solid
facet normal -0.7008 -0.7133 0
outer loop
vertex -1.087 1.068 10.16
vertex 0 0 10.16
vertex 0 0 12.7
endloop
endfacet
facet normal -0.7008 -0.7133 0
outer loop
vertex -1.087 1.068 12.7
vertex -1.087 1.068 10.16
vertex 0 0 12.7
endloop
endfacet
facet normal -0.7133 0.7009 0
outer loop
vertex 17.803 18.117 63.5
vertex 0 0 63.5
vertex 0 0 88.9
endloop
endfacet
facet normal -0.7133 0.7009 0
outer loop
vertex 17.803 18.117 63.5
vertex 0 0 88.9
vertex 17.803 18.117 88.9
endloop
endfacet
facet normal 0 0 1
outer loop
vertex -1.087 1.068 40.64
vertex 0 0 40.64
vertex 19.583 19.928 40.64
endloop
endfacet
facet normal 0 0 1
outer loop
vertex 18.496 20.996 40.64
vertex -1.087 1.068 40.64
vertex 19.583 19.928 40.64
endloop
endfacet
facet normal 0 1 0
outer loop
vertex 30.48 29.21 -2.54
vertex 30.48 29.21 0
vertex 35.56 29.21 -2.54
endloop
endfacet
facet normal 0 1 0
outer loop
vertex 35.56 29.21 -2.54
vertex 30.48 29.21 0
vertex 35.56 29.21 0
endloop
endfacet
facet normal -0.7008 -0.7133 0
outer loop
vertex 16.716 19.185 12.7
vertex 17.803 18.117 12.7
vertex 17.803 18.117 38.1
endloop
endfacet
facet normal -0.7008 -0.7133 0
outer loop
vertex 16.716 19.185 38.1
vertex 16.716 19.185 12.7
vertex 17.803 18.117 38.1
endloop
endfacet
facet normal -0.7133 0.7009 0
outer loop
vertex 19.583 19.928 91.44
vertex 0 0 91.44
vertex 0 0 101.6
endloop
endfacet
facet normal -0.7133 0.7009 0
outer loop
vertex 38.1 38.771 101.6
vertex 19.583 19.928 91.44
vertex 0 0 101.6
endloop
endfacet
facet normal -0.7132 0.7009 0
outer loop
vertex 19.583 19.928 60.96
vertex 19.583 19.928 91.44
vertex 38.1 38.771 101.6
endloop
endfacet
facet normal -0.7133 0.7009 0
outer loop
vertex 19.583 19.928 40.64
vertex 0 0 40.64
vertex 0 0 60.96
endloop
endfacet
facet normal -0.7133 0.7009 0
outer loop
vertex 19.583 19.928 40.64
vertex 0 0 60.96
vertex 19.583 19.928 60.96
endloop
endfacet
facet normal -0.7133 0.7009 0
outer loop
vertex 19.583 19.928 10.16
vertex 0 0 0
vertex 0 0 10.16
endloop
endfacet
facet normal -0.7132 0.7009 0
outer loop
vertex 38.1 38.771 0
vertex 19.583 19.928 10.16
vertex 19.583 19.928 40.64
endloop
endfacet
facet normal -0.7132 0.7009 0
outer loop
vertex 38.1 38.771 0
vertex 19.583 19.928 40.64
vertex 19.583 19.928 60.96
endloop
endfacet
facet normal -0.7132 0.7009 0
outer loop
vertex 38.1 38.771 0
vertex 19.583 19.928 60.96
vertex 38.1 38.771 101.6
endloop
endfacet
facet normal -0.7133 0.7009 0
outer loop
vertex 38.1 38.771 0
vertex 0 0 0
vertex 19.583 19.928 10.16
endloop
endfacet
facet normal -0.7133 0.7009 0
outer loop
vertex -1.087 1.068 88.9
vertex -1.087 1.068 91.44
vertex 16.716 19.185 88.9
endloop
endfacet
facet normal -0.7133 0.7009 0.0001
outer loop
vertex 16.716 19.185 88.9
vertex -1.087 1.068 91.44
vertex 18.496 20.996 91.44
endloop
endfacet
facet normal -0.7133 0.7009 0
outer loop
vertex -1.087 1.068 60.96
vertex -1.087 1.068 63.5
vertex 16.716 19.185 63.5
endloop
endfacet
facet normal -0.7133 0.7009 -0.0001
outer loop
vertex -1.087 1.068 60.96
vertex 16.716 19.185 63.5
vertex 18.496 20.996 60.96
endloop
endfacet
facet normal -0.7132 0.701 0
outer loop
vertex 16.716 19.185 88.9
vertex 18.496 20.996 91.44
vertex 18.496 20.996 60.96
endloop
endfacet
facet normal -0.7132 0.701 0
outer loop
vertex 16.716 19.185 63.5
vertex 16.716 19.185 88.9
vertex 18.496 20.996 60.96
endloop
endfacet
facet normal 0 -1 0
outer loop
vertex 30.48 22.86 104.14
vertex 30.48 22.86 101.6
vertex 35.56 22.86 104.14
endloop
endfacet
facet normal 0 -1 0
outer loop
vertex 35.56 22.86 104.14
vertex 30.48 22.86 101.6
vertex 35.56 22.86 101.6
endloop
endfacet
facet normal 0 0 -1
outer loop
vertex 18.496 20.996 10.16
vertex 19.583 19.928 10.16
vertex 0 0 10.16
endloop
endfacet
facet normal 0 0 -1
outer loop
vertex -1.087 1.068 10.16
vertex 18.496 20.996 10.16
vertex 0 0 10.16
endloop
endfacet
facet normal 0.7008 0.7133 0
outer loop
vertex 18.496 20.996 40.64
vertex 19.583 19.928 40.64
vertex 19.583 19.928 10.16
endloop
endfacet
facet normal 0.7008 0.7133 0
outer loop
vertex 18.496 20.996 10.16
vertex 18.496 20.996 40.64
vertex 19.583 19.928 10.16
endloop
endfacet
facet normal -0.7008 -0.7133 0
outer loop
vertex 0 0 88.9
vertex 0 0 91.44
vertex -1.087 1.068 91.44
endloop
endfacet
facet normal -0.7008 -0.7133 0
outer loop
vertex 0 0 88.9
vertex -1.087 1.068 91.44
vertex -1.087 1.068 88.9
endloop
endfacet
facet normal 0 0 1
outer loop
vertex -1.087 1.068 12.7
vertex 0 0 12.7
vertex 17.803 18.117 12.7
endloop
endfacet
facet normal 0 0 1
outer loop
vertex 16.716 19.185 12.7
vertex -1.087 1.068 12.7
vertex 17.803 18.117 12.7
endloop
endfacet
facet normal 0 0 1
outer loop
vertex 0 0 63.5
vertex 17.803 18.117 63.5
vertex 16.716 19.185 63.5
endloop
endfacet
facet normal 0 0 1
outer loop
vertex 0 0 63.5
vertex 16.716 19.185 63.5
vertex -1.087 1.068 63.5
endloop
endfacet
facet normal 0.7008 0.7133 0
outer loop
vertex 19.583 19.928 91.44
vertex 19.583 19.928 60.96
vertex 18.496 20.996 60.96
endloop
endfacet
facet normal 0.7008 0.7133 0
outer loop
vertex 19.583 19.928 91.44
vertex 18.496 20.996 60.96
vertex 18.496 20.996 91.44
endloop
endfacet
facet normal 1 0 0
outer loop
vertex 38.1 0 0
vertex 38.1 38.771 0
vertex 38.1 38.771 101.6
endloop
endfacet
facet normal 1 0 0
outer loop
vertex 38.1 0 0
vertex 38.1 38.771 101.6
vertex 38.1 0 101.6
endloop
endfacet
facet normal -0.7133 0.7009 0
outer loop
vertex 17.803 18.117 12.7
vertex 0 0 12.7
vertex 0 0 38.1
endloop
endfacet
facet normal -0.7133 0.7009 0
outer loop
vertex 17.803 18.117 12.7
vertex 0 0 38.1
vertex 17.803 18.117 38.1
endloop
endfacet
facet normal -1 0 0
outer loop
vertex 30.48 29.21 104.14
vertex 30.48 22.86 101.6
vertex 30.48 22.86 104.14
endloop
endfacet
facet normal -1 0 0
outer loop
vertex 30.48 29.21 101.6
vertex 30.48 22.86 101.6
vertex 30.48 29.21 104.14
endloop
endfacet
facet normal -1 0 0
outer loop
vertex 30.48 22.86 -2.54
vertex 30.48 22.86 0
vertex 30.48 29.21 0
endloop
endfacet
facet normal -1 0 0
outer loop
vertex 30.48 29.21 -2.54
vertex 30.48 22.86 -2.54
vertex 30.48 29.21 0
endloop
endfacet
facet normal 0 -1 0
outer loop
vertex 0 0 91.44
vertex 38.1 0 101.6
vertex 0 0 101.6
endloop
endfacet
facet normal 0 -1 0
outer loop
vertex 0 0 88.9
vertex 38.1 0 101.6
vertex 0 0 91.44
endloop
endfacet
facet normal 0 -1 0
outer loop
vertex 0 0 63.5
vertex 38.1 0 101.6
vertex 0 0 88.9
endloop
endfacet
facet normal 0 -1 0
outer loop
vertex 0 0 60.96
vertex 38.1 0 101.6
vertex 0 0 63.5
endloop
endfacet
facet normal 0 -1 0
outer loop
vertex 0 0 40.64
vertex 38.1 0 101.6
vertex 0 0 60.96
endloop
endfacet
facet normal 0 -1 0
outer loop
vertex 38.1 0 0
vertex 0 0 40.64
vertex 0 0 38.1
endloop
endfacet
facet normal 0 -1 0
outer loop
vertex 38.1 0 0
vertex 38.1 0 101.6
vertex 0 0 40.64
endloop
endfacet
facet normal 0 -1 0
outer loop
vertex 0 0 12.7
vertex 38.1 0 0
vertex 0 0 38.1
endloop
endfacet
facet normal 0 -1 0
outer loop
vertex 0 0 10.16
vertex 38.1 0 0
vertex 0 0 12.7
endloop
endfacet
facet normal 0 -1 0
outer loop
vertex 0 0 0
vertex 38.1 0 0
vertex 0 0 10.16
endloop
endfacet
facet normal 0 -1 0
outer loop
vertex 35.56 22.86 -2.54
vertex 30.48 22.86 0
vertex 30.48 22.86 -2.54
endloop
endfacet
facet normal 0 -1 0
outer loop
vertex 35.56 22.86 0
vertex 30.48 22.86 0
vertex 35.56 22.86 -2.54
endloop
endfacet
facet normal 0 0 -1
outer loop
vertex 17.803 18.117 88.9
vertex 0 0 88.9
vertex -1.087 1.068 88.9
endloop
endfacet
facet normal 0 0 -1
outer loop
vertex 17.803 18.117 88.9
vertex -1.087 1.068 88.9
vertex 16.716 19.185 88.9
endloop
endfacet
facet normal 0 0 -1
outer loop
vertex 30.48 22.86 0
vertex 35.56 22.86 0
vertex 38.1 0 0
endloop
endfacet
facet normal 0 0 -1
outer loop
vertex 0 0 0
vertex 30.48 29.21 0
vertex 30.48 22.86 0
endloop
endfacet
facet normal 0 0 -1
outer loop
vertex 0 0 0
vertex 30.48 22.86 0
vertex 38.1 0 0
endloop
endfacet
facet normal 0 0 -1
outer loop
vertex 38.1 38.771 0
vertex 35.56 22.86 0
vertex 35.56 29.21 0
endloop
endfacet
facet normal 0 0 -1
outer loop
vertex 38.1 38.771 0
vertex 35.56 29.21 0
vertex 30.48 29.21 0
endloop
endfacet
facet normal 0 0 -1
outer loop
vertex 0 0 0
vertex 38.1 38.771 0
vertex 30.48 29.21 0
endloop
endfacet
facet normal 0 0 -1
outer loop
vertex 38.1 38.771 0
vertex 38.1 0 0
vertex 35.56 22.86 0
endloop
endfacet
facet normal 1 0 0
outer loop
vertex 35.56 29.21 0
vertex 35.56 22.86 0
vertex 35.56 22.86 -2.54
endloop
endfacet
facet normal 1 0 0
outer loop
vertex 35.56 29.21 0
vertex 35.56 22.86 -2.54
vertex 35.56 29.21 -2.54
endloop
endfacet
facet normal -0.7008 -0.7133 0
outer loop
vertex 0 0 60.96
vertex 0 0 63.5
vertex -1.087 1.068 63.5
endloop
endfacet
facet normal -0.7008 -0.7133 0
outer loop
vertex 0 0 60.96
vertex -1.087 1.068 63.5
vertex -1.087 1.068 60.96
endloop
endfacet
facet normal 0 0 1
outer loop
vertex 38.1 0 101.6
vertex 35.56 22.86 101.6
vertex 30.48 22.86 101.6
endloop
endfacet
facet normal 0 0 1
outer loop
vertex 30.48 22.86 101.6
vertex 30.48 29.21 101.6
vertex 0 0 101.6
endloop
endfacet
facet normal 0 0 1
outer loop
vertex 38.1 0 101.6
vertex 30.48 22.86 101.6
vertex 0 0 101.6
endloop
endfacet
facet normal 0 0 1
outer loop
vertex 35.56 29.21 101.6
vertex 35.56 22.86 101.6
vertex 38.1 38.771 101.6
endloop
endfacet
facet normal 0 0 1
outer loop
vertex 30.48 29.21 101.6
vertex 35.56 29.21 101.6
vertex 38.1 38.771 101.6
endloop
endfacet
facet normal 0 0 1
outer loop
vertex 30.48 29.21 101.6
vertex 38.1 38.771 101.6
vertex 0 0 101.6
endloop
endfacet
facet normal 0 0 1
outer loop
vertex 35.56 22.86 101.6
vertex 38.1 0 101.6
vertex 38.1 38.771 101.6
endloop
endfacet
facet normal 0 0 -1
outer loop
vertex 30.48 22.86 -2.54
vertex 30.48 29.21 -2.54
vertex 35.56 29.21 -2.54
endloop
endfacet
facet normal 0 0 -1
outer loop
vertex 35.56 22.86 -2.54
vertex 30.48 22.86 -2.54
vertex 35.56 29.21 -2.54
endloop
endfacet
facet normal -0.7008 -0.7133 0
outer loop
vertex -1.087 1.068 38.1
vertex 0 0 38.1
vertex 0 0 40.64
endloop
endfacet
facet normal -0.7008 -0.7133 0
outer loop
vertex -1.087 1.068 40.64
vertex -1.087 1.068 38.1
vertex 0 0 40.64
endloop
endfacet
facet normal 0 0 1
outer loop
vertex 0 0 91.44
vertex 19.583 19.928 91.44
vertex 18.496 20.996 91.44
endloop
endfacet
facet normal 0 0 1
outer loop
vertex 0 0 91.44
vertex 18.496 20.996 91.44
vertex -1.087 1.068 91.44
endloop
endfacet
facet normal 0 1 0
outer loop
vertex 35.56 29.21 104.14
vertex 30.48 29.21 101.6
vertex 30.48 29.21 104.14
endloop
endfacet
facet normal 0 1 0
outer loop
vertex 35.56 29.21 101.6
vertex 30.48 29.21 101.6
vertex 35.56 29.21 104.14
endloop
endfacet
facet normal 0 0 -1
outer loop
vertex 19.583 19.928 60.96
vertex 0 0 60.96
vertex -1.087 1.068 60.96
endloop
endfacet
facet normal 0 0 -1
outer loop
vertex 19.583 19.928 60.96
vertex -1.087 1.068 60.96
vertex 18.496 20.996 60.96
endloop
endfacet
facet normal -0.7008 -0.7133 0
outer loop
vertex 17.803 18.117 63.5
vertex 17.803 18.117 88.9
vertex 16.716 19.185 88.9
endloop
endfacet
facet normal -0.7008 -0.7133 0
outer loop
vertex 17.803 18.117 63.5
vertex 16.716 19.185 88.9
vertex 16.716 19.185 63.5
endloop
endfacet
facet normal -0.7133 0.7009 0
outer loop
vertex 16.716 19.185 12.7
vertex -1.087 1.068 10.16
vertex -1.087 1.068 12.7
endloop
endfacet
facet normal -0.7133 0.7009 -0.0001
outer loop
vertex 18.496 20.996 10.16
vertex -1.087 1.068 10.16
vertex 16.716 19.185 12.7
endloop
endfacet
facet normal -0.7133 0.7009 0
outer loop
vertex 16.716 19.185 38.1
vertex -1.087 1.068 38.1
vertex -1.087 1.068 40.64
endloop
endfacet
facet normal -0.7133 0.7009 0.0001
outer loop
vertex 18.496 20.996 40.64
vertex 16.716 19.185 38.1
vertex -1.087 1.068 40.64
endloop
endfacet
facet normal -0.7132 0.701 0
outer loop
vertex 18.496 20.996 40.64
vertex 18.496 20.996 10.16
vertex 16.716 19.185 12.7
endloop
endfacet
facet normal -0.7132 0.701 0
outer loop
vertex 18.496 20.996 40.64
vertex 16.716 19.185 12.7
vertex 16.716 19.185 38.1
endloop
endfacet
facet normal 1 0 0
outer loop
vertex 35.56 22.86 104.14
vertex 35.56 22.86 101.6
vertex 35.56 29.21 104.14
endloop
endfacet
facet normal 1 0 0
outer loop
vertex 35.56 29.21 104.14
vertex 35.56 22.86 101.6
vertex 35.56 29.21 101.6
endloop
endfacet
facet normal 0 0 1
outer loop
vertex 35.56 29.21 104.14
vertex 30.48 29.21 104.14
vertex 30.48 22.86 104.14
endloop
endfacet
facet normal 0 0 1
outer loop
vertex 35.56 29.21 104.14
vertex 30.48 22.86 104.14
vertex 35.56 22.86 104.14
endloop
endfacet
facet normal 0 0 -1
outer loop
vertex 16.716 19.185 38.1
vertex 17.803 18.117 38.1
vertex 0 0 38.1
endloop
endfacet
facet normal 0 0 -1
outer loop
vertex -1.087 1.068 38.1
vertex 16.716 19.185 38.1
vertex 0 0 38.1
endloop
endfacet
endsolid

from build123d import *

# Parameters (mm, degrees)
BOSS_EXTRUDE1_DEPTH = 101.6
SKETCH2_W           = 5.08
SKETCH2_H           = 6.35
BOSS_EXTRUDE2_DEPTH = 2.54
BOSS_EXTRUDE3_START = -101.6
SKETCH2_2_W         = 5.08
SKETCH2_2_H         = 6.35
BOSS_EXTRUDE3_DEPTH = 2.54
BOSS_EXTRUDE4_DEPTH = 1.524


with BuildPart() as part:
    # Sketch1 → Boss-Extrude1 (new body)
    with BuildSketch(Plane.XY):
        Polygon((0, 0), (38.1, 38.770841672), (38.1, 0), align=None)
    extrude(amount=BOSS_EXTRUDE1_DEPTH)

    # Sketch2 → Boss-Extrude2 (add)
    with BuildSketch(Plane.XY.offset(101.6)):
        with Locations((33.02, 26.035)):
            Rectangle(SKETCH2_W, SKETCH2_H)
    extrude(amount=BOSS_EXTRUDE2_DEPTH)

    # Sketch2<2> → Boss-Extrude3 (add)
    with BuildSketch(Plane.XY.offset(101.6).offset(BOSS_EXTRUDE3_START)):
        with Locations((33.02, 26.035)):
            Rectangle(SKETCH2_2_W, SKETCH2_2_H)
    extrude(amount=-BOSS_EXTRUDE3_DEPTH)

    # Sketch3 → Boss-Extrude4 (add)
    with BuildSketch(Plane(origin=(0, 0, 0), x_dir=(0, 0, 1), z_dir=(-0.7132504491541779, 0.7009092642998548, 0))):
        Polygon((12.7, 0), (12.7, 25.4), (38.1, 25.4), (38.1, 0), (40.64, 0), (40.64, 27.94), (10.16, 27.94), (10.16, 0), align=None)
        Polygon((88.9, 0), (88.9, 25.4), (63.5, 25.4), (63.5, 0), (60.96, 0), (60.96, 27.94), (91.44, 27.94), (91.44, 0), align=None)
    extrude(amount=BOSS_EXTRUDE4_DEPTH)


solid = part.part
